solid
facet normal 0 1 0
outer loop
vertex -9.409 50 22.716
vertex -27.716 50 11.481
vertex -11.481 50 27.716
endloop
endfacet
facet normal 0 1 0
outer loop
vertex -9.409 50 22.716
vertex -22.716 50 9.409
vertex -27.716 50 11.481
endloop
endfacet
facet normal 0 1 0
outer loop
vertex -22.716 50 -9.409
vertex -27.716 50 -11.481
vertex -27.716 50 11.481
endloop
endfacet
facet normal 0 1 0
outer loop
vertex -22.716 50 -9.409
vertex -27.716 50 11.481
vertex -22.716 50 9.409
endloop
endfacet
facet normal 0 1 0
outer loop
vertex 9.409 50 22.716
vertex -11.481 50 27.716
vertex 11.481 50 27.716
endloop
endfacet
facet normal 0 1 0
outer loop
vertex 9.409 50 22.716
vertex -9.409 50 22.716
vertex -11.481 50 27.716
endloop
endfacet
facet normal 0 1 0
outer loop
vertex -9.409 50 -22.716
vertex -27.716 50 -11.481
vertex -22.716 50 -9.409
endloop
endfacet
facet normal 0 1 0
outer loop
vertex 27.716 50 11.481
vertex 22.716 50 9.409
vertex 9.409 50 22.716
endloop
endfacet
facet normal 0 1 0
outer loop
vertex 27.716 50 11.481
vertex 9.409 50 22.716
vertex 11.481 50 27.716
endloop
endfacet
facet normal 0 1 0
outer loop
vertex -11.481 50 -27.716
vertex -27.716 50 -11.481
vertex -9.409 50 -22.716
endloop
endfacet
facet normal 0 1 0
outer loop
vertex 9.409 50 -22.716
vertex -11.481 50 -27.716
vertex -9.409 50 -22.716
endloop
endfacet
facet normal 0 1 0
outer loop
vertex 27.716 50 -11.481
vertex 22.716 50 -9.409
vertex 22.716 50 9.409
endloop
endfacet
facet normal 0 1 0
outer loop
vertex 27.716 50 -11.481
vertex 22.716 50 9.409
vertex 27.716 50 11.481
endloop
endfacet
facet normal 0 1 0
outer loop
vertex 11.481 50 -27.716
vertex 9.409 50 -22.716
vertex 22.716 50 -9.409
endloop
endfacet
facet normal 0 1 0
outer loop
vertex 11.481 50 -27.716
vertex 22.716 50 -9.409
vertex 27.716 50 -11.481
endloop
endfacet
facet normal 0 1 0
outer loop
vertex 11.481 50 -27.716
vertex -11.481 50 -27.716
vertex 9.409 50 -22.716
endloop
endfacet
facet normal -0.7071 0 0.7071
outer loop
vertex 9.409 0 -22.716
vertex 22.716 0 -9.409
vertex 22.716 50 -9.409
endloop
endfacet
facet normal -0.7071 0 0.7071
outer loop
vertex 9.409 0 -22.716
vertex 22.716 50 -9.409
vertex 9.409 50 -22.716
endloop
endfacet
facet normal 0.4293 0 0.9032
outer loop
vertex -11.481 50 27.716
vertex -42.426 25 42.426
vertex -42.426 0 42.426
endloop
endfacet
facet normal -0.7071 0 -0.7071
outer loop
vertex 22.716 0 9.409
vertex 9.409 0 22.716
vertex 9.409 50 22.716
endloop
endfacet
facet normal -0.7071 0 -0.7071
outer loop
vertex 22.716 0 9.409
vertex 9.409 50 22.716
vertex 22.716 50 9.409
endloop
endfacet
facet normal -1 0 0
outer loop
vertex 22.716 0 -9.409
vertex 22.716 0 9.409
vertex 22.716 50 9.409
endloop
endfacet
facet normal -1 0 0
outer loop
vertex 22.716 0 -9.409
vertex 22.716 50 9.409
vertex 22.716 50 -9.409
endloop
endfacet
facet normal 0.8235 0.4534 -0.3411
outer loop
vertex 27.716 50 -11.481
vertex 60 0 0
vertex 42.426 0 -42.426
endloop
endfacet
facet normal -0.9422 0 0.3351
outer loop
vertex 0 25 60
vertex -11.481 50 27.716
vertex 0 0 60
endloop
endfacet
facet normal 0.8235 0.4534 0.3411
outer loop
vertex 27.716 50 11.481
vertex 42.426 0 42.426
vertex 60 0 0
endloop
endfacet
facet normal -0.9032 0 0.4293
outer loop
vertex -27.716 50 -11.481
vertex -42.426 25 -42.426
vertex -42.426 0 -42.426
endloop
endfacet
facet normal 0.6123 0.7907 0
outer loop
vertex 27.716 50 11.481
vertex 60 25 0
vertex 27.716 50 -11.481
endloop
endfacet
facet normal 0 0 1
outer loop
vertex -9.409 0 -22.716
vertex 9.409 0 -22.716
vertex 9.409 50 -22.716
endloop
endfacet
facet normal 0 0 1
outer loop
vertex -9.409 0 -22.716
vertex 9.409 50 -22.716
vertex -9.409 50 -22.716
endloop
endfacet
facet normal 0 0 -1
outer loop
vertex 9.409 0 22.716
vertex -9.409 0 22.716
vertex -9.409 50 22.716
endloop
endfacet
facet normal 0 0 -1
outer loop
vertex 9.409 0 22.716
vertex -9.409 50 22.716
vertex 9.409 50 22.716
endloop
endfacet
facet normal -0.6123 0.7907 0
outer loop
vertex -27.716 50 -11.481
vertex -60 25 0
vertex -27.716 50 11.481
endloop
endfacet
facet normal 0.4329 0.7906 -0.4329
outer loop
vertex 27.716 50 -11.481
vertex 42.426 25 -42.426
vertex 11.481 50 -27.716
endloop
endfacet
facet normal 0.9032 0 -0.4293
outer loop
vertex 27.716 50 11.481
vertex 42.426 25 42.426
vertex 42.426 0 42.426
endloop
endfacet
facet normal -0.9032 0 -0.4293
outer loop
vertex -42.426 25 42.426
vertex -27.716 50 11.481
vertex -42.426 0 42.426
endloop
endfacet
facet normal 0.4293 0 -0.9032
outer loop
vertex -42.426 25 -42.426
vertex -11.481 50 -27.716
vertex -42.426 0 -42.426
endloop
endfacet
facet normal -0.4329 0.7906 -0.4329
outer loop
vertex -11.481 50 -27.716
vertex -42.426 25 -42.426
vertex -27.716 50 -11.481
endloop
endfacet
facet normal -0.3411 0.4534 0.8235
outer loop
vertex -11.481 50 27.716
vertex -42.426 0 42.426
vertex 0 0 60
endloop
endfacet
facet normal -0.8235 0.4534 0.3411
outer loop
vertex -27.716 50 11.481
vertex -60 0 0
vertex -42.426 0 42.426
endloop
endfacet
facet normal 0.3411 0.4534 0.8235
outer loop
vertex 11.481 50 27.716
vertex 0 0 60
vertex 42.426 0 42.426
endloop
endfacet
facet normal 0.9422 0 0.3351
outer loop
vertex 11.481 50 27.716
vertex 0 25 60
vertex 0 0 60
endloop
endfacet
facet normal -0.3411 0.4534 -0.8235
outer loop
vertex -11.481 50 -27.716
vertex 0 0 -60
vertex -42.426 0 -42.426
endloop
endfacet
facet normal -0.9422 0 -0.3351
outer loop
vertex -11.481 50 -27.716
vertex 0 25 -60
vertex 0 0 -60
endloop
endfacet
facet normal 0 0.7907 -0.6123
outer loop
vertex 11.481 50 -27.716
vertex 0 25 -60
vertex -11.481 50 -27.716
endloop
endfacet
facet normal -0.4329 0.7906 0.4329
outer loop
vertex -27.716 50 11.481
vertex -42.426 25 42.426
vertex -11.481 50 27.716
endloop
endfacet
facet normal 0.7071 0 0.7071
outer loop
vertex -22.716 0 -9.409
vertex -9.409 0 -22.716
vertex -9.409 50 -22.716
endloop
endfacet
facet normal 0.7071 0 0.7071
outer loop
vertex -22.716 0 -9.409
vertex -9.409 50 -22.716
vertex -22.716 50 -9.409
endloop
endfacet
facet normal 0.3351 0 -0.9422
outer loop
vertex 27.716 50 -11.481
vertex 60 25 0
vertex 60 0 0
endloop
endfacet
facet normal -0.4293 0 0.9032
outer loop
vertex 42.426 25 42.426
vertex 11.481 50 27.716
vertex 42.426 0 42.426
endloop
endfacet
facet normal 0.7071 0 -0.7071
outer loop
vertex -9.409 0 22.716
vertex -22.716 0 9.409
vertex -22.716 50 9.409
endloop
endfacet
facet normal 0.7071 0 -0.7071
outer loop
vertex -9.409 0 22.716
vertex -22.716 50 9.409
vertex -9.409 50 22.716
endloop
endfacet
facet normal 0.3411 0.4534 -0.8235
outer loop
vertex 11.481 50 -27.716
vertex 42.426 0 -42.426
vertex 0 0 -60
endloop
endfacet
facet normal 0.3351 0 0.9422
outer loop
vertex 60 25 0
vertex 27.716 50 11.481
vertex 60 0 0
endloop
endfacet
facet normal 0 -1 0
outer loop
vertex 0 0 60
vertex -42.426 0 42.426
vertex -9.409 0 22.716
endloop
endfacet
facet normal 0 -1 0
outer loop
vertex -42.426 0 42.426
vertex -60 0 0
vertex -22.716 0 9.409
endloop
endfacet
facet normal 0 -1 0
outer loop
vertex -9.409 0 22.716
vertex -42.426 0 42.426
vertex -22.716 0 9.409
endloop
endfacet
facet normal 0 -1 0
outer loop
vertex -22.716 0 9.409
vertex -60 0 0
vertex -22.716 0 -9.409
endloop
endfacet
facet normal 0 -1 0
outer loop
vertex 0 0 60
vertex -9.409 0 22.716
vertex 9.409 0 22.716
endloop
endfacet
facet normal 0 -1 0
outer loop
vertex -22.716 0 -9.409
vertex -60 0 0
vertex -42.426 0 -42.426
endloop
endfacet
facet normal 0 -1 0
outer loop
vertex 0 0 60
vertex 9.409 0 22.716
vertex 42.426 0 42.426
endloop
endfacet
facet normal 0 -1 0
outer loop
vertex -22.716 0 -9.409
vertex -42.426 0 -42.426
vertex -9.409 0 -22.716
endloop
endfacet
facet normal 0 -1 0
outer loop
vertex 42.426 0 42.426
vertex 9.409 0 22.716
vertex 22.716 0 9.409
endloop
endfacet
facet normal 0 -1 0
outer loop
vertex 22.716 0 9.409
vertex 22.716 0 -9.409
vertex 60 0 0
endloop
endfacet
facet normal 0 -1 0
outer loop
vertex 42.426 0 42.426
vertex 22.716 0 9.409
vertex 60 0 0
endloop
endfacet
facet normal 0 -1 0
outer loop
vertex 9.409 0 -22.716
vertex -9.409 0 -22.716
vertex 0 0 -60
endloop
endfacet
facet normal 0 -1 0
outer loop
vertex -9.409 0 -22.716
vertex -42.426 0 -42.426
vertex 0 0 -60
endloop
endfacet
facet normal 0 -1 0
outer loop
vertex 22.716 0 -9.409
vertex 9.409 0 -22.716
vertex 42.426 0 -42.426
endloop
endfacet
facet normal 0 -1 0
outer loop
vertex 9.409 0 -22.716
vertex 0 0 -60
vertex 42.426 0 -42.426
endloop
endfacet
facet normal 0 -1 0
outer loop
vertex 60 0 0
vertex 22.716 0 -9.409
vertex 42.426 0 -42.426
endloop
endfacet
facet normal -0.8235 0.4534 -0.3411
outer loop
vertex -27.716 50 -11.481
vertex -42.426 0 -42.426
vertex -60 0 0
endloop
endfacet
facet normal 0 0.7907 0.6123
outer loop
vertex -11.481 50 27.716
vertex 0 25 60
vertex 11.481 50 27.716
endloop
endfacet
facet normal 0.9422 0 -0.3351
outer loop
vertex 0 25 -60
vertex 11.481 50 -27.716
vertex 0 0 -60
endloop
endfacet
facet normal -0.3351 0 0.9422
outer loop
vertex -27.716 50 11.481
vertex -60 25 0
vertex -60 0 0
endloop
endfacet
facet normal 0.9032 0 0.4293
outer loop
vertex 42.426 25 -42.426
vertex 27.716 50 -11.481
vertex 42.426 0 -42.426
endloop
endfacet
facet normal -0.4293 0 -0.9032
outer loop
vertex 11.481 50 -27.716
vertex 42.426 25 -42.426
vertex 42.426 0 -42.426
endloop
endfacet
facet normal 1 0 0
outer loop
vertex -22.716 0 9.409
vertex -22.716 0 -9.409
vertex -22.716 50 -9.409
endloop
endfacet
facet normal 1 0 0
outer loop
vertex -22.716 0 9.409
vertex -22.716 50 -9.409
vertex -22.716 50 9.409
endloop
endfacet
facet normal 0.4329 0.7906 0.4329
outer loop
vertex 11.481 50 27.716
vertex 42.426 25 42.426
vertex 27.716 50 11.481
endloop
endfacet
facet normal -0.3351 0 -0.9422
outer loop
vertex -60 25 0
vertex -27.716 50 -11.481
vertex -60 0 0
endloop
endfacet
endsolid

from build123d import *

# Parameters (mm, degrees)
EXTRUDE_2_DEPTH                 = 50
SKETCH_4_W                      = 120
SKETCH_4_H                      = 97.901728648
CUT_EXTRUDE_1_DEPTH             = 50
PATTERN_CIRCULAR_1_COUNT        = 8
EXTRUDE_3_DEPTH                 = 50
CUT_EXTRUDE_2_REACH             = 100.489
CUT_EXTRUDE_2_DIRECTION_2_REACH = 100.489
PATTERN_CIRCULAR_3_COUNT        = 8
EXTRUDE_4_DEPTH                 = 50


with BuildPart() as part:
    # 草图3 → 凸台-拉伸2 (new body)
    with BuildSketch(Plane(origin=(0, 0, 0), x_dir=(1, 0, 0), z_dir=(0, 1, 0))):
        Polygon((-42.426406871, -42.426406871), (0, -60), (42.426406871, -42.426406871), (60, 0), (42.426406871, 42.426406871), (0, 60), (-42.426406871, 42.426406871), (-60, 0), align=None)
        Polygon((27.716385975, -11.480502971), (11.480502971, -27.716385975), (-11.480502971, -27.716385975), (-27.716385975, -11.480502971), (-27.716385975, 11.480502971), (-11.480502971, 27.716385975), (11.480502971, 27.716385975), (27.716385975, 11.480502971), align=None, mode=Mode.SUBTRACT)
    extrude(amount=EXTRUDE_2_DEPTH)

    # 草图4 → 切除-拉伸1 (cut)
    with BuildSketch(Plane(origin=(-16.852857596, 22.400493343, 40.686397374), x_dir=(0.9400294128280147, 0.16450882670917247, 0.2988001823175307), z_dir=(-0.3410933933957357, 0.4533747611963636, 0.8234722963718466))):
        Rectangle(SKETCH_4_W, SKETCH_4_H)
    cut_extrude_1 = extrude(amount=CUT_EXTRUDE_1_DEPTH, mode=Mode.SUBTRACT)

    # 阵列(圆周)1: 切除-拉伸1 ×8 about axis
    pattern_circular_1_axis = Axis((0, 80.427502856, 0), (0, -1, 0))
    for i in range(1, PATTERN_CIRCULAR_1_COUNT):
        add(cut_extrude_1.rotate(pattern_circular_1_axis, i * 360 / PATTERN_CIRCULAR_1_COUNT), mode=Mode.SUBTRACT)

    # 草图5 → 凸台-拉伸3 (add)
    with BuildSketch(Plane(origin=(0, 0, 0), x_dir=(1, 0, 0), z_dir=(0, 1, 0))):
        Polygon((-27.716385975, 11.480502971), (-60, 0), (-27.716385975, -11.480502971), align=None)
    extrude_3 = extrude(amount=EXTRUDE_3_DEPTH)

    # 草图6 → 切除-拉伸2 (cut, up to next)
    with BuildSketch(Plane.XY, mode=Mode.PRIVATE) as cut_extrude_2_sk1:
        Polygon((-27.716385975, 50), (-60, 50), (-60, 25), align=None)
    cut_extrude_2_tool1 = extrude(cut_extrude_2_sk1.sketch, amount=-CUT_EXTRUDE_2_REACH, mode=Mode.PRIVATE) & part.part
    cut_extrude_2 = cut_extrude_2_tool1.solids().sort_by_distance((-49.238795, 41.666667, 0))[0]
    add(cut_extrude_2, mode=Mode.SUBTRACT)

    # 草图6 → 切除-拉伸2 direction 2 (cut, up to next)
    with BuildSketch(Plane.XY, mode=Mode.PRIVATE) as cut_extrude_2_direction_2_sk1:
        Polygon((-27.716385975, 50), (-60, 50), (-60, 25), align=None)
    cut_extrude_2_direction_2_tool1 = extrude(cut_extrude_2_direction_2_sk1.sketch, amount=CUT_EXTRUDE_2_DIRECTION_2_REACH, mode=Mode.PRIVATE) & part.part
    cut_extrude_2_direction_2 = cut_extrude_2_direction_2_tool1.solids().sort_by_distance((-49.238795, 41.666667, 0))[0]
    add(cut_extrude_2_direction_2, mode=Mode.SUBTRACT)

    # 阵列(圆周)3: 凸台-拉伸3, 切除-拉伸2, 切除-拉伸2 direction 2 ×8 about axis
    pattern_circular_3_axis = Axis((0, 80.427502856, 0), (0, -1, 0))
    add([extrude_3.rotate(pattern_circular_3_axis, i * 360 / PATTERN_CIRCULAR_3_COUNT) for i in range(1, PATTERN_CIRCULAR_3_COUNT)])
    add([cut_extrude_2.rotate(pattern_circular_3_axis, i * 360 / PATTERN_CIRCULAR_3_COUNT) for i in range(1, PATTERN_CIRCULAR_3_COUNT)], mode=Mode.SUBTRACT)
    add([cut_extrude_2_direction_2.rotate(pattern_circular_3_axis, i * 360 / PATTERN_CIRCULAR_3_COUNT) for i in range(1, PATTERN_CIRCULAR_3_COUNT)], mode=Mode.SUBTRACT)

    # 草图3<4> → 凸台-拉伸4 (add)
    with BuildSketch(Plane(origin=(0, 0, 0), x_dir=(1, 0, 0), z_dir=(0, 1, 0))):
        Polygon((-11.480502971, -27.716385975), (11.480502971, -27.716385975), (27.716385975, -11.480502971), (27.716385975, 11.480502971), (11.480502971, 27.716385975), (-11.480502971, 27.716385975), (-27.716385975, 11.480502971), (-27.716385975, -11.480502971), align=None)
        Polygon((-22.716385975, 9.409435159), (-9.409435159, 22.716385975), (9.409435159, 22.716385975), (22.716385975, 9.409435159), (22.716385975, -9.409435159), (9.409435159, -22.716385975), (-9.409435159, -22.716385975), (-22.716385975, -9.409435159), align=None, mode=Mode.SUBTRACT)
    extrude(amount=EXTRUDE_4_DEPTH)


solid = part.part
